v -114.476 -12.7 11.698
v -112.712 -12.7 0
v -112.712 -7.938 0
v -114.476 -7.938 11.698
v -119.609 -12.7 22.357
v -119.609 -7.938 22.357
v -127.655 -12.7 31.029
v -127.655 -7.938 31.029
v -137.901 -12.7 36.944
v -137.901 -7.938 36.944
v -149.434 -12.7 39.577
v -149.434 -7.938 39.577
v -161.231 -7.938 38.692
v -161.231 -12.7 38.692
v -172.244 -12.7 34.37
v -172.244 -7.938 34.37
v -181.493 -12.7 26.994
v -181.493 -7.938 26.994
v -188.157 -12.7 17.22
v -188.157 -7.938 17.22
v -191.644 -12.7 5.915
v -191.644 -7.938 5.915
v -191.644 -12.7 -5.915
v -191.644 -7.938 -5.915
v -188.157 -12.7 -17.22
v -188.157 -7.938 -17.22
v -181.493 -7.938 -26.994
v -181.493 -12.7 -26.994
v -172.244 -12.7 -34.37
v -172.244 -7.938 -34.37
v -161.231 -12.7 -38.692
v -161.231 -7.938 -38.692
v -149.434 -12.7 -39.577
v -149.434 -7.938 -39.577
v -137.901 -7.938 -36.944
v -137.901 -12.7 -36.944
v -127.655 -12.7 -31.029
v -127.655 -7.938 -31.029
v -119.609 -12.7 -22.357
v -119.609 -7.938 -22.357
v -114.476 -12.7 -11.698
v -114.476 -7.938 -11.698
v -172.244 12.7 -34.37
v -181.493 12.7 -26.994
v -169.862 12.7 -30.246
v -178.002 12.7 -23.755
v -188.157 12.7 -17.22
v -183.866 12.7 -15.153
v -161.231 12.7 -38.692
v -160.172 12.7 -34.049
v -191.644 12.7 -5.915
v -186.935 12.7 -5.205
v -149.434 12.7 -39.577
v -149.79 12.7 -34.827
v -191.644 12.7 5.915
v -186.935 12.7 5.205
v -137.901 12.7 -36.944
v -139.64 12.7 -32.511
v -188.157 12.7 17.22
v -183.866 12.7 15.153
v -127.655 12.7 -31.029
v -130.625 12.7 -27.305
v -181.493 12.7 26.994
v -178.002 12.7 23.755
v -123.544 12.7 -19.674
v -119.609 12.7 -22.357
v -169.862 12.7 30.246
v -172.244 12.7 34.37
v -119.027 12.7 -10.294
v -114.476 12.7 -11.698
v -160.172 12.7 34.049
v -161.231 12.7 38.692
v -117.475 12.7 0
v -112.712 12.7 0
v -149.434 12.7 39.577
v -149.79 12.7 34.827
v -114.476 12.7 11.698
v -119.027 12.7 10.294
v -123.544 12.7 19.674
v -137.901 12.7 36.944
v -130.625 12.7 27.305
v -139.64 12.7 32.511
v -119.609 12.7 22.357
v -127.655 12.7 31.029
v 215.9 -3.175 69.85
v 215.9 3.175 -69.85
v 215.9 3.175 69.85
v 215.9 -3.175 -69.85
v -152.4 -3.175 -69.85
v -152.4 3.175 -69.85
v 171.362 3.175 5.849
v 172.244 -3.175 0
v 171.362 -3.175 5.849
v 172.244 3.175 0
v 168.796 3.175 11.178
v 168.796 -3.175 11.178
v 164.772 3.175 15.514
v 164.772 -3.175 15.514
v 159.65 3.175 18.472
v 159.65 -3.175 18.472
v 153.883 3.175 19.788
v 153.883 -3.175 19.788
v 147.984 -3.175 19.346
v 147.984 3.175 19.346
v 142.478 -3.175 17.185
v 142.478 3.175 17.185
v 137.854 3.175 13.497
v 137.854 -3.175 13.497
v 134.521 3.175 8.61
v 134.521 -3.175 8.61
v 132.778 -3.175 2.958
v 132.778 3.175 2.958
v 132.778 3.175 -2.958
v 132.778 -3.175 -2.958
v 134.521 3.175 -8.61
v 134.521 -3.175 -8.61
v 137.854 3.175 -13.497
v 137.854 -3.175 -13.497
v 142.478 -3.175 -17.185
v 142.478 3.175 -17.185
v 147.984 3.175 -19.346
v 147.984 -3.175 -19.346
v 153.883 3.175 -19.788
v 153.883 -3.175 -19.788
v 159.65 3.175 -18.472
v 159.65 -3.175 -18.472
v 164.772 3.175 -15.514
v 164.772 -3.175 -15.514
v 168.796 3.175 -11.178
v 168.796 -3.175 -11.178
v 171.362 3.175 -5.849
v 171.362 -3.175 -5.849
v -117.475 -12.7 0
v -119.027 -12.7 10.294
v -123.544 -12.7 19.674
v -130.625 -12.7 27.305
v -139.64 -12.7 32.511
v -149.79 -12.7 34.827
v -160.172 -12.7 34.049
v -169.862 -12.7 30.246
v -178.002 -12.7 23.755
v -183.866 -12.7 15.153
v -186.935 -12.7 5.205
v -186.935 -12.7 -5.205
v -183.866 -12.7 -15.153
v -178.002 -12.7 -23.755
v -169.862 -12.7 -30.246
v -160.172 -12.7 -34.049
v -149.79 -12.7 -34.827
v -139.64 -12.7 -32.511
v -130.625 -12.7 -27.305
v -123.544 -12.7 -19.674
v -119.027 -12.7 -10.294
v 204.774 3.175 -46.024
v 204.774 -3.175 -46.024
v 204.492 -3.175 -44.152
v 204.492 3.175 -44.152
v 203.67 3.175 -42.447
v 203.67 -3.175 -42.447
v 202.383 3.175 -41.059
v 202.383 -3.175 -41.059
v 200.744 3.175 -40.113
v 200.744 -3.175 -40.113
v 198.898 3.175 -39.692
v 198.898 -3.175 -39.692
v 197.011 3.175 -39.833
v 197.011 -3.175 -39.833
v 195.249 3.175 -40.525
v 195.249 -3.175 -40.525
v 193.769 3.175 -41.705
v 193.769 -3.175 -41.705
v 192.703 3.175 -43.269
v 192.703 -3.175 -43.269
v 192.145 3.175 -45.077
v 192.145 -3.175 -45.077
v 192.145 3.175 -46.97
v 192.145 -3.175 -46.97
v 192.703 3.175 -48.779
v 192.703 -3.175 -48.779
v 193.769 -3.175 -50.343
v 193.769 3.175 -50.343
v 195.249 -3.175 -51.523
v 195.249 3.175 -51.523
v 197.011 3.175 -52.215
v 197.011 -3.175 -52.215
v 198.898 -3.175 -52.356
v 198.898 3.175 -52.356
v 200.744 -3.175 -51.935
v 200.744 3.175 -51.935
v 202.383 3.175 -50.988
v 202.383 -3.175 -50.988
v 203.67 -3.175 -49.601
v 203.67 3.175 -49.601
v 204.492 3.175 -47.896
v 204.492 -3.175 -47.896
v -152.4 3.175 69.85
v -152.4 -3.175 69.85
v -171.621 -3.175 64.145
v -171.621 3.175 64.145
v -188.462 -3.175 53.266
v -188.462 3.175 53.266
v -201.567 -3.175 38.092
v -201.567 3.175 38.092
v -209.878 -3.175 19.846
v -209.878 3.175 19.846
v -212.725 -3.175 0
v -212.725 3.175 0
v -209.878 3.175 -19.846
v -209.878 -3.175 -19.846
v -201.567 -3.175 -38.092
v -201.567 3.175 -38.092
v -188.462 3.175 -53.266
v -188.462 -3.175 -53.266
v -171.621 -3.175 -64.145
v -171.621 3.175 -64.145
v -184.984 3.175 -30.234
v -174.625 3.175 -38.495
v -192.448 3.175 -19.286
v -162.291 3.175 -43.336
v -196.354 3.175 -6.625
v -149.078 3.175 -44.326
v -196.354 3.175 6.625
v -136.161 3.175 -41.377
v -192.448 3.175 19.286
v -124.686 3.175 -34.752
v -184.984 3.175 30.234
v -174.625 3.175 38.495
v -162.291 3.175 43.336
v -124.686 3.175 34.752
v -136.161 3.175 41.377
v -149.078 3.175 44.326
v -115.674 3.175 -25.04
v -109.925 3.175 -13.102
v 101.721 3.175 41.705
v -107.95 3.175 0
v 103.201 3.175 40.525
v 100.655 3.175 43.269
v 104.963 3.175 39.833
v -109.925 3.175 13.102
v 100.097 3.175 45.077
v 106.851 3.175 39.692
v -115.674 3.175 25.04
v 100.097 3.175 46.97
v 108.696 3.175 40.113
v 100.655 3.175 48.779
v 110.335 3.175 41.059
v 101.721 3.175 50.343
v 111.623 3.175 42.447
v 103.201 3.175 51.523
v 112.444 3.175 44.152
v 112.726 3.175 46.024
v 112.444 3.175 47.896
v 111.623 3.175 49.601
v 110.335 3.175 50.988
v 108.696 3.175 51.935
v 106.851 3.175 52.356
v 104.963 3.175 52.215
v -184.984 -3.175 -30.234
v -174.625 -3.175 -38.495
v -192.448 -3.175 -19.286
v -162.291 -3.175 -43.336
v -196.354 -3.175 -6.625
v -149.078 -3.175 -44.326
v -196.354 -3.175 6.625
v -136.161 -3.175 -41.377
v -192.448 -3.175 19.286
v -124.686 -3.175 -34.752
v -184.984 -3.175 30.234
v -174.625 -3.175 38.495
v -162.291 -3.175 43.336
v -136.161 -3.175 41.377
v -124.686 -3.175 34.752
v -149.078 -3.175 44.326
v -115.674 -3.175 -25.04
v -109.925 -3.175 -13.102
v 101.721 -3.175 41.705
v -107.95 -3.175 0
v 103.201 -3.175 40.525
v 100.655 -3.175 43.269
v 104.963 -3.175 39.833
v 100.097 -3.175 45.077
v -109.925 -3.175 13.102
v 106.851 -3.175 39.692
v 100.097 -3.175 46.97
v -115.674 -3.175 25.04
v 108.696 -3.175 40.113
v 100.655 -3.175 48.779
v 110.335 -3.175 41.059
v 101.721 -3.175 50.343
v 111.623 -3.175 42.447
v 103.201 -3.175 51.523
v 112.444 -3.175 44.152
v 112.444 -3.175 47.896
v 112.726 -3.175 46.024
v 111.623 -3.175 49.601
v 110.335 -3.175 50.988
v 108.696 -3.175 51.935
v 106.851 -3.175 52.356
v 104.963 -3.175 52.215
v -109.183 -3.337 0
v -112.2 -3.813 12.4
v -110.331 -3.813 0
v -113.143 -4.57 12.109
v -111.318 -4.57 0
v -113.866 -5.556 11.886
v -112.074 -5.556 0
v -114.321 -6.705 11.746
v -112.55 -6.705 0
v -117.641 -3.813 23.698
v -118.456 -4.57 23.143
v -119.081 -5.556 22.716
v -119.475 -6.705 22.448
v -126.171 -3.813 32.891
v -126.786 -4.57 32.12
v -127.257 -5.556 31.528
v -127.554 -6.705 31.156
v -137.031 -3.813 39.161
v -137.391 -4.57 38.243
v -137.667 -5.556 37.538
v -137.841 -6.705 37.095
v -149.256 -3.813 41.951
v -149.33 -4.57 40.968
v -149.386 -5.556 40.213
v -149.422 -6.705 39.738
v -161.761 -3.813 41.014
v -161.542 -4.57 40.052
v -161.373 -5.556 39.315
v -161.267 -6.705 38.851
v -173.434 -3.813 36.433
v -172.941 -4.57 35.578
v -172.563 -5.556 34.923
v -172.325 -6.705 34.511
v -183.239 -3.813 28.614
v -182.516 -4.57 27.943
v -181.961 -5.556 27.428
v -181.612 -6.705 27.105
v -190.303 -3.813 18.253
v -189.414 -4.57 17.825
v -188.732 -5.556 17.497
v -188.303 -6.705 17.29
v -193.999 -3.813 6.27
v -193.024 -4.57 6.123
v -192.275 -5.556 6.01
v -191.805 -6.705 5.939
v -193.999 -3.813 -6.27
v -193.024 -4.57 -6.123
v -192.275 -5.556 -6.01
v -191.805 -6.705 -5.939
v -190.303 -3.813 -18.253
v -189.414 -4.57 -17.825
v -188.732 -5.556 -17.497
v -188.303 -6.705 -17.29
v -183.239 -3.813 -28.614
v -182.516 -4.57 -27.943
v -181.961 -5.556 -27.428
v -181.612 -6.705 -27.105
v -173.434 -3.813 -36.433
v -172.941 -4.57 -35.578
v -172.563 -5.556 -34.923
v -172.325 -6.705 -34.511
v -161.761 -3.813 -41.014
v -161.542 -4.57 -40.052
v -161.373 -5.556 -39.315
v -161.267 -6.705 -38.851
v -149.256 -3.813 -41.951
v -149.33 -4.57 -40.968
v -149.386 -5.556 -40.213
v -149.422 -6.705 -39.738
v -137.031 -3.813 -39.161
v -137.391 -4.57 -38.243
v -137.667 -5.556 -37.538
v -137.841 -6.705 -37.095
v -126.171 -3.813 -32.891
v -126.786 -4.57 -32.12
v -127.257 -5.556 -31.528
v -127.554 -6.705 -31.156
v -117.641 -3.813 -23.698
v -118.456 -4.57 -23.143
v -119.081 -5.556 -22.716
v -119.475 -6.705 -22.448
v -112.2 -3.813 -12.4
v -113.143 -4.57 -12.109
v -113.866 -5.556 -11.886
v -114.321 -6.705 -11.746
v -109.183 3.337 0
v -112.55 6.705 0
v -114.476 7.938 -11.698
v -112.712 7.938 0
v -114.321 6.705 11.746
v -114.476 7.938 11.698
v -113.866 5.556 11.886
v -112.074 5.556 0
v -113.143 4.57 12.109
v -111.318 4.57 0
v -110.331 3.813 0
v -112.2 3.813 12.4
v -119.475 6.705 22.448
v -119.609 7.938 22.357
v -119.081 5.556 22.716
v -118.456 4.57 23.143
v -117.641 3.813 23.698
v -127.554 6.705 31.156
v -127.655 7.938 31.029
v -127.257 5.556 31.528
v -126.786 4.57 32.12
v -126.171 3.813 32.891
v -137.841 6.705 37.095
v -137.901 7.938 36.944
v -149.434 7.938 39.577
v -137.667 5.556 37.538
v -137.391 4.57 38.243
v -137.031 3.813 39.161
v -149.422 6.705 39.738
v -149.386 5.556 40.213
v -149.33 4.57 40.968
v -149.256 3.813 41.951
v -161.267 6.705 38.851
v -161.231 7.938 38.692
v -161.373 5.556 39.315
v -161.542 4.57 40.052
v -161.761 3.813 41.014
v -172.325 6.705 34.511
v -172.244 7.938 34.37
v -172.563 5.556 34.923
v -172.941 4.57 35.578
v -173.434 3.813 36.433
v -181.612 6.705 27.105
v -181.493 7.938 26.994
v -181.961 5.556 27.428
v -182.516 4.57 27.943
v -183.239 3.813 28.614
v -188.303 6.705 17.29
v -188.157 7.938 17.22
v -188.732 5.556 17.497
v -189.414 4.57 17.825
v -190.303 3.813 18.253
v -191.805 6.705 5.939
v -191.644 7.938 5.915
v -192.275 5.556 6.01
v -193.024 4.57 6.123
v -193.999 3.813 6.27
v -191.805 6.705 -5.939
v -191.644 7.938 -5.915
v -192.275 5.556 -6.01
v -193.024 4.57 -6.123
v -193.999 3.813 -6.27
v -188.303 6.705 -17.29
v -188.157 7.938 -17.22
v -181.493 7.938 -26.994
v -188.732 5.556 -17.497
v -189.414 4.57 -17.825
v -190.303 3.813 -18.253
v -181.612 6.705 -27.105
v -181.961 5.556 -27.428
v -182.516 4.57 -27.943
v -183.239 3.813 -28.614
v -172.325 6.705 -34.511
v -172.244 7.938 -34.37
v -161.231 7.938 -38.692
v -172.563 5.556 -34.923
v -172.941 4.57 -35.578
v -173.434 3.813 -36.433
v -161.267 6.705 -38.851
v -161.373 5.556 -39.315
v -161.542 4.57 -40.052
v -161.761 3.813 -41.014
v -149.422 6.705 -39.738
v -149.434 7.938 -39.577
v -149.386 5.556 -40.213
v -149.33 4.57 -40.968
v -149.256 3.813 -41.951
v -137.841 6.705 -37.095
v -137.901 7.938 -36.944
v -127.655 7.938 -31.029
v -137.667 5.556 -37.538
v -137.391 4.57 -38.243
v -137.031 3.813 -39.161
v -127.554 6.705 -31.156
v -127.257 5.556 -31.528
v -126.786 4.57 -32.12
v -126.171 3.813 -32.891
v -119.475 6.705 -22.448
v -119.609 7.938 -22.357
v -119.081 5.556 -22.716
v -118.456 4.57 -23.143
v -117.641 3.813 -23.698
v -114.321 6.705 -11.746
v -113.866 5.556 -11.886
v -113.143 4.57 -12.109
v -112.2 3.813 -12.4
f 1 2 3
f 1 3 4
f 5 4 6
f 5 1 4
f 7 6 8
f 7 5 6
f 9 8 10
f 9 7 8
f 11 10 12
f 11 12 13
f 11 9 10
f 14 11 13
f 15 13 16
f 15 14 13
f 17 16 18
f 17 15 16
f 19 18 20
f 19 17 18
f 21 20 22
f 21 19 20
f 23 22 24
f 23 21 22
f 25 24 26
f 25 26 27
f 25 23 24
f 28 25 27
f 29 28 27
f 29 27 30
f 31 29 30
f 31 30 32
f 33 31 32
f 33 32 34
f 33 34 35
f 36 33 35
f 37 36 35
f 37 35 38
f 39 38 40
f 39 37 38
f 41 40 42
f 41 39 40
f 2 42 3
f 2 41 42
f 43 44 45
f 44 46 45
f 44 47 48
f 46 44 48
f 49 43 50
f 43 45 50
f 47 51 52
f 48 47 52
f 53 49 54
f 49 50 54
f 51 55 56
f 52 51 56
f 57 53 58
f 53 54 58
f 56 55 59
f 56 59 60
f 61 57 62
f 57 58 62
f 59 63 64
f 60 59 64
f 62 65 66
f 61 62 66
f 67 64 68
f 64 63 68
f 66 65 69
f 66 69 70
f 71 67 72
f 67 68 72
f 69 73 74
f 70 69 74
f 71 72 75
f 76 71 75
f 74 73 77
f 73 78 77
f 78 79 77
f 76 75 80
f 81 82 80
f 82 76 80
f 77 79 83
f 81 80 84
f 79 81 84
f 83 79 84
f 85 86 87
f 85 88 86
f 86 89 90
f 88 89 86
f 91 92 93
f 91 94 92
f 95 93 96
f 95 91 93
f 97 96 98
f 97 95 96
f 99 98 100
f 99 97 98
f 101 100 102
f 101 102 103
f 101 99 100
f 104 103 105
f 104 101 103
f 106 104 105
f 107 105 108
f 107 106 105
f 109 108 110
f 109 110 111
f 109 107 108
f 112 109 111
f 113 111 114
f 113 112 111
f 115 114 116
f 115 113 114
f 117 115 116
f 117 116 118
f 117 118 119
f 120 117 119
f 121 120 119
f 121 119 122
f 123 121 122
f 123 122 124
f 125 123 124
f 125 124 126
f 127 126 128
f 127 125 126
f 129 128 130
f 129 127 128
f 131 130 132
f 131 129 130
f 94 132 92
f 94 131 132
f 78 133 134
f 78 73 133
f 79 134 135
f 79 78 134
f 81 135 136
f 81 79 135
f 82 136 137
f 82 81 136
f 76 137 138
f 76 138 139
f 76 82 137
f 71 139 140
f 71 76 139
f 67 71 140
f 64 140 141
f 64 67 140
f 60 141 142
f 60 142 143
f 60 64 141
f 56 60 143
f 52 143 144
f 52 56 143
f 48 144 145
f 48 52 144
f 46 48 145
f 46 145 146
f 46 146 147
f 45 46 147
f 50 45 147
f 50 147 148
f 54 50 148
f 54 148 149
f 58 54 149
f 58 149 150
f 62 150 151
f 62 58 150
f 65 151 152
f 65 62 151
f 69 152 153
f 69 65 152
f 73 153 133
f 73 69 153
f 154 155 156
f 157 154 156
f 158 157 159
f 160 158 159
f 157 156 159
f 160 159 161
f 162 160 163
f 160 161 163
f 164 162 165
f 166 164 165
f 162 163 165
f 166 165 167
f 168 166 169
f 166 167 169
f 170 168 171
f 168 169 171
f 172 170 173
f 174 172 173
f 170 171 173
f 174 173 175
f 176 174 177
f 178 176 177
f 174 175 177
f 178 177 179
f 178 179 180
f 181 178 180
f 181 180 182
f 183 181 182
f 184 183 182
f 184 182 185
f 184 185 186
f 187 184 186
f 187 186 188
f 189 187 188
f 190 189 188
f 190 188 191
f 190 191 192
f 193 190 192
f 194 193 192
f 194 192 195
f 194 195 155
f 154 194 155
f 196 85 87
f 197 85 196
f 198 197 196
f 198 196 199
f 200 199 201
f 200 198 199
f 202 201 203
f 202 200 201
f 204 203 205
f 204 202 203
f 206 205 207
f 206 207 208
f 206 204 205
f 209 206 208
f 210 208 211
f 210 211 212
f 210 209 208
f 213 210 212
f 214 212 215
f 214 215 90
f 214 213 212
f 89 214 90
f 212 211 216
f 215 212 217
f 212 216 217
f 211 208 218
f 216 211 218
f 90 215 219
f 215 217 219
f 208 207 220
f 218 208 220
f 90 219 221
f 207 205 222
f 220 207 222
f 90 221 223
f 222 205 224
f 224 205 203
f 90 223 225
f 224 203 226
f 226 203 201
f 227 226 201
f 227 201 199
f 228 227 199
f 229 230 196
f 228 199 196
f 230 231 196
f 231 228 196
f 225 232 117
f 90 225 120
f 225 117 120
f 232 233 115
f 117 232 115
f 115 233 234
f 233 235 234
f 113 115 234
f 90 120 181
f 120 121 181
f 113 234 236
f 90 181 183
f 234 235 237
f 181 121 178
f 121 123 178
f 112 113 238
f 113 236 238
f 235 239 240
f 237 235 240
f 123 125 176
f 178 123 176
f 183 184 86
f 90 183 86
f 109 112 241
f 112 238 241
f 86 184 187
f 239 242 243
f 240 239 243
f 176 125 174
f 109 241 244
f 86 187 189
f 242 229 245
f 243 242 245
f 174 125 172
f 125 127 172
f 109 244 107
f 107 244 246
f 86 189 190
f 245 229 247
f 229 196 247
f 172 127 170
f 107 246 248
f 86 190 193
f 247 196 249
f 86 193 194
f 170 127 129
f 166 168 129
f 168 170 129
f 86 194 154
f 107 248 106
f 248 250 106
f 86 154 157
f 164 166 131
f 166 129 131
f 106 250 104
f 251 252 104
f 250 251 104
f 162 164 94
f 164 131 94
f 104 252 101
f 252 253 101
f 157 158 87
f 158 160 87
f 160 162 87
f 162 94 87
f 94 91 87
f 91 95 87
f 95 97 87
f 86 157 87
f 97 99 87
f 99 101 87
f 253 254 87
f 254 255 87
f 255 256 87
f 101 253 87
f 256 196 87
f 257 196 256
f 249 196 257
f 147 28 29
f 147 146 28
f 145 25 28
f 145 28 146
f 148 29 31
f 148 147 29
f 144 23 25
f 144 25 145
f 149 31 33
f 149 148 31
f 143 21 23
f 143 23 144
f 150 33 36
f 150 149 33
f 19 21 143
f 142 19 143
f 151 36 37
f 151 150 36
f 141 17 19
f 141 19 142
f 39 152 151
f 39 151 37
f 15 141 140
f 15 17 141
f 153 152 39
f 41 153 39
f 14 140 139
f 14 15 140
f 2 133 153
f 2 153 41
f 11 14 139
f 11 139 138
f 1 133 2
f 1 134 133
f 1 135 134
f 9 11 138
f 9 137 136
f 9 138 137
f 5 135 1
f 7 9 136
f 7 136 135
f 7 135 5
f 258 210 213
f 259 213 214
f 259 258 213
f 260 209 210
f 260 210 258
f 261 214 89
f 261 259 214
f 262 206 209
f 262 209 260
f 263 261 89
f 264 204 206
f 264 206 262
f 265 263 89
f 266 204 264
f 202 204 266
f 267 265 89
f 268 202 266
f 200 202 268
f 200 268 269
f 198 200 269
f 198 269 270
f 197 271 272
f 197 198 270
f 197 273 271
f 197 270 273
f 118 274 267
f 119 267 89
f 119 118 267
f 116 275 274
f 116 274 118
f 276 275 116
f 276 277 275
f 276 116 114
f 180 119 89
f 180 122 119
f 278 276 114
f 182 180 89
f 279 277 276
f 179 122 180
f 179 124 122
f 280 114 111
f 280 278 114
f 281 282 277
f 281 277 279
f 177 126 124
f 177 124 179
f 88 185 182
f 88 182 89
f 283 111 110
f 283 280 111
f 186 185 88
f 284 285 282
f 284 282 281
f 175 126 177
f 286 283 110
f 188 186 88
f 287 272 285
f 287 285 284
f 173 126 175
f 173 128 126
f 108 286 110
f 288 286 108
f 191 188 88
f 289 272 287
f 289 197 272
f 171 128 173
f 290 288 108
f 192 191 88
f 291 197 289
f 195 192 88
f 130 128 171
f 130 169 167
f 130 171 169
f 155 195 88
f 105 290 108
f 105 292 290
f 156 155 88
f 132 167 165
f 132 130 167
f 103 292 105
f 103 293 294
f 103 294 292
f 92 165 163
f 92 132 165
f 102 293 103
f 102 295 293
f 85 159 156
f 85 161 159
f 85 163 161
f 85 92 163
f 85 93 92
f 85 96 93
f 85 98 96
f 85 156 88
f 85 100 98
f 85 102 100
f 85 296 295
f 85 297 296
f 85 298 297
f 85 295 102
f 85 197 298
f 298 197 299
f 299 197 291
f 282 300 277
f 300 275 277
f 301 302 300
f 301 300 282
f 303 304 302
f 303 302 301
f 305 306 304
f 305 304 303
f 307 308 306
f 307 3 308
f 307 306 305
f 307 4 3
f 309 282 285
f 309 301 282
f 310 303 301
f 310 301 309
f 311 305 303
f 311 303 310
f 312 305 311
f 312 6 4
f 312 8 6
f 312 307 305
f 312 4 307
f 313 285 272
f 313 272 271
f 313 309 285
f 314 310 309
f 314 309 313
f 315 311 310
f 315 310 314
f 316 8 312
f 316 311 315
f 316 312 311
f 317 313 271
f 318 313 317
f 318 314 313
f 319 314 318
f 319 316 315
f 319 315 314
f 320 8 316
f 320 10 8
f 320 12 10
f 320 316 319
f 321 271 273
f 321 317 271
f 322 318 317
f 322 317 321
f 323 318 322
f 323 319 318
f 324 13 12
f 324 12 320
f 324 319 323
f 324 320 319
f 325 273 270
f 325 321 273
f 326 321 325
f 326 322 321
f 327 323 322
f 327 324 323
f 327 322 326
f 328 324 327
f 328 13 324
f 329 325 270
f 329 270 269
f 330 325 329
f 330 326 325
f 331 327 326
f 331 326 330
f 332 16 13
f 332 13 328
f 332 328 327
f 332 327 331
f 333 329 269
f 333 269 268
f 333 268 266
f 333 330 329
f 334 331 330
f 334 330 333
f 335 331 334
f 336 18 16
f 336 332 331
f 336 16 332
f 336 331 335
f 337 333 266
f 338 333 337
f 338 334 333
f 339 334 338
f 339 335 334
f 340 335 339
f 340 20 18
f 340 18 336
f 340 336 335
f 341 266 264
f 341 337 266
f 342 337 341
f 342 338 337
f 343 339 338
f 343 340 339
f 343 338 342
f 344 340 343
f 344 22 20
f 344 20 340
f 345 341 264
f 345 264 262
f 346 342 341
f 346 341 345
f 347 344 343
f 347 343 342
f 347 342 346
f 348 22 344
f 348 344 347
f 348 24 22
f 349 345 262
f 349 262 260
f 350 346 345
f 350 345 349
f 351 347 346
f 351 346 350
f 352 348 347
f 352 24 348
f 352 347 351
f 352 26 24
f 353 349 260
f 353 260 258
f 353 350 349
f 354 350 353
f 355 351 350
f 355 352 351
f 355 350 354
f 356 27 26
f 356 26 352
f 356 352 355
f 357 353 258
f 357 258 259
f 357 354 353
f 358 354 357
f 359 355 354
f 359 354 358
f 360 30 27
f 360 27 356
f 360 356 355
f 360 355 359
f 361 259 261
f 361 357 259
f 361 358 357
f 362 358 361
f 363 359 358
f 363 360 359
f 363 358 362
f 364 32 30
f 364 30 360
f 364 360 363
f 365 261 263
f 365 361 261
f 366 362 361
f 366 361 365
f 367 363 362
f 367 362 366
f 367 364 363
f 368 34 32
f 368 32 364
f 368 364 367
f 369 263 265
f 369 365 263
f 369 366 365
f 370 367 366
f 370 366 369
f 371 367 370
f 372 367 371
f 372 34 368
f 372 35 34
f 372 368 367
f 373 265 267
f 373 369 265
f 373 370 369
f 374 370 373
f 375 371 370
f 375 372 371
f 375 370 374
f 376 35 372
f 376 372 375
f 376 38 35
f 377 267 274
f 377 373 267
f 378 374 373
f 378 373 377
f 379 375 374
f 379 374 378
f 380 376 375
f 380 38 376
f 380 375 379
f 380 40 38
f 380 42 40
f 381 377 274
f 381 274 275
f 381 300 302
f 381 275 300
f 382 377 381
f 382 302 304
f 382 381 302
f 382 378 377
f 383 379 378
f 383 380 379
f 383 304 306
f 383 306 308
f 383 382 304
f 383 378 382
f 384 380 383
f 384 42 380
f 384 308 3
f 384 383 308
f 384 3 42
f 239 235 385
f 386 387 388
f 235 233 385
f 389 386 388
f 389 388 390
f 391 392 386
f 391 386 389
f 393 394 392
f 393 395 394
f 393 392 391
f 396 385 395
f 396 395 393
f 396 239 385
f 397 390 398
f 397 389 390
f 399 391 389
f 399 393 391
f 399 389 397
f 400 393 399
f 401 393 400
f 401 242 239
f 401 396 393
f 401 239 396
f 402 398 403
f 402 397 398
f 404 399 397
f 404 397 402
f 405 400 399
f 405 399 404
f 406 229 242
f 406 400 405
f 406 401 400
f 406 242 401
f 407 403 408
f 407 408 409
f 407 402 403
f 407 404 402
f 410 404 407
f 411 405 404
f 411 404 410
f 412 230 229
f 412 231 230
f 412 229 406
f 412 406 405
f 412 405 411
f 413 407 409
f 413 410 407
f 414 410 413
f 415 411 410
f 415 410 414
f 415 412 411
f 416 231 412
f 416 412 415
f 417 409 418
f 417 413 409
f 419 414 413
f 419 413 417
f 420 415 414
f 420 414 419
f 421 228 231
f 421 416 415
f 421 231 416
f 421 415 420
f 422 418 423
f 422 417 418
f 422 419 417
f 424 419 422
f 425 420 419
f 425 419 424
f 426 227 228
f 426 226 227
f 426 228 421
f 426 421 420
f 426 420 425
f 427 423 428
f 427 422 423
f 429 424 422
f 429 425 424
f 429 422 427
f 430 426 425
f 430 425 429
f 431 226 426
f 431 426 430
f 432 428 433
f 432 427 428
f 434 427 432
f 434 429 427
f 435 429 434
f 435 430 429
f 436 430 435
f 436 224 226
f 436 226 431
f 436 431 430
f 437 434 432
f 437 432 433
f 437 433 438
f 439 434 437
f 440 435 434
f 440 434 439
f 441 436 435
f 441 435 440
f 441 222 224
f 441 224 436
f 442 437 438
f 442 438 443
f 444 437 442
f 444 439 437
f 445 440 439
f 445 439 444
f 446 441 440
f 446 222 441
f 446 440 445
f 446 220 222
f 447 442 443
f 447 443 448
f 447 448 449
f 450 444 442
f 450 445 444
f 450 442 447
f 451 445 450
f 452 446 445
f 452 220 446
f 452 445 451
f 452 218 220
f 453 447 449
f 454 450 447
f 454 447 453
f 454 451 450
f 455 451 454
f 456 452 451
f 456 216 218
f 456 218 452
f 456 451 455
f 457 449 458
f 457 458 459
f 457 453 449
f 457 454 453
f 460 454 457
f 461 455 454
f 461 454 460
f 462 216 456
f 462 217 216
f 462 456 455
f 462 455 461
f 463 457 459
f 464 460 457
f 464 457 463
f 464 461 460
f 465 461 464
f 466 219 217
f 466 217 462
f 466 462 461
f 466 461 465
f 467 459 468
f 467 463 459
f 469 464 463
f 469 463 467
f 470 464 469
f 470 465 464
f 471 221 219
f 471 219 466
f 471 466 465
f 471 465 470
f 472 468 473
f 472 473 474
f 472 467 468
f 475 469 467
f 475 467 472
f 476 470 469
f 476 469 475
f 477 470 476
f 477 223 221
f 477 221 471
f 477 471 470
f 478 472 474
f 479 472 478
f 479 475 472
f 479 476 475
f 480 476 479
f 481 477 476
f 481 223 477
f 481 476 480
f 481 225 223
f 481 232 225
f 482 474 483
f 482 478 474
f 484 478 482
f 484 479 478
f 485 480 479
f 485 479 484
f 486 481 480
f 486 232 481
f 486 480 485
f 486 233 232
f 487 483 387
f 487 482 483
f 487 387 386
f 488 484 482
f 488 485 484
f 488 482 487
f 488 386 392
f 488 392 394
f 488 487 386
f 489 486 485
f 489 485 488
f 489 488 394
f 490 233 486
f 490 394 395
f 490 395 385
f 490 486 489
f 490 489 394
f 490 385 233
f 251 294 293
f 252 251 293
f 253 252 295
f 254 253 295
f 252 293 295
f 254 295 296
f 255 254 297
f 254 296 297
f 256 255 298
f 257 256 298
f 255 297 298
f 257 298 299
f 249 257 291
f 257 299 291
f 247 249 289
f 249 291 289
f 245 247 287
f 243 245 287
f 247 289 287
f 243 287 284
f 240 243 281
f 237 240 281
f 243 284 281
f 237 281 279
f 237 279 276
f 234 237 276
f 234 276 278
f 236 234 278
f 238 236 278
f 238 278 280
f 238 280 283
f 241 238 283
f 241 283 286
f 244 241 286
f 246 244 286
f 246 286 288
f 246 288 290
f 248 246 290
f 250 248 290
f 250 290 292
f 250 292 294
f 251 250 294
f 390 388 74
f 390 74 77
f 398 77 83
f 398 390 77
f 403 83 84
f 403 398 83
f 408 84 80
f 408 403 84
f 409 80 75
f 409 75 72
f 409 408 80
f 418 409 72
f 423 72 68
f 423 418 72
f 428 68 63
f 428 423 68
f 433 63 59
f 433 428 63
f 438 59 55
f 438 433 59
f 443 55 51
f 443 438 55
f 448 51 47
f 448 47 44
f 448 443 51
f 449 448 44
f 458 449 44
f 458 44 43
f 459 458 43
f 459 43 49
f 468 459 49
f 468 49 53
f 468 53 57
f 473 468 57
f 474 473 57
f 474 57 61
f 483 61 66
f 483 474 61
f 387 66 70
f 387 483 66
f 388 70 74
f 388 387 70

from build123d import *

# Parameters (mm, degrees)
F0_R     = 39.6875
F0_R_2   = 19.84375
F1_DEPTH = 3.175
F0_R_3   = 34.925
F2_DEPTH = 12.7
F3_R     = 4.7625
F5_D     = 12.7


with BuildPart() as f1:
    # F0 (on Front) → F1 (new body, symmetric)
    with BuildSketch(Plane.XZ):
        with BuildLine():
            Line((215.9, -69.85), (215.9, 69.85))
            Line((215.9, 69.85), (-152.4, 69.85))
            ThreePointArc((-152.4, 69.85), (-212.725, 0), (-152.4, -69.85))
            Line((-152.4, -69.85), (215.9, -69.85))
        make_face()
        with Locations((-152.4, 0)):
            Circle(F0_R, mode=Mode.SUBTRACT)
        with Locations((152.4, 0)):
            Circle(F0_R_2, mode=Mode.SUBTRACT)
    extrude(amount=F1_DEPTH, both=True)

    # F0 (on Front) → F2 (join, symmetric)
    with BuildSketch(Plane.XZ):
        with Locations((-152.4, 0)):
            Circle(F0_R)
        with Locations((-152.4, 0)):
            Circle(F0_R_3, mode=Mode.SUBTRACT)
    extrude(amount=F2_DEPTH, both=True)

    # F3
    f3_edges = [f1.edges().sort_by_distance(p)[0] for p in [
        (-192.0875, -3.175, 0),
        (-192.0875, 3.175, 0),
    ]]
    fillet(f3_edges, radius=F3_R)

    # F5 (through all)
    with Locations(Plane(origin=(0, 3.175, 0), x_dir=(-1, 0, 0), z_dir=(0, 1, 0))):
        with Locations((-106.376187, 46.023813), (-198.423813, -46.023813)):
            Hole(F5_D / 2)


solid = f1.part
